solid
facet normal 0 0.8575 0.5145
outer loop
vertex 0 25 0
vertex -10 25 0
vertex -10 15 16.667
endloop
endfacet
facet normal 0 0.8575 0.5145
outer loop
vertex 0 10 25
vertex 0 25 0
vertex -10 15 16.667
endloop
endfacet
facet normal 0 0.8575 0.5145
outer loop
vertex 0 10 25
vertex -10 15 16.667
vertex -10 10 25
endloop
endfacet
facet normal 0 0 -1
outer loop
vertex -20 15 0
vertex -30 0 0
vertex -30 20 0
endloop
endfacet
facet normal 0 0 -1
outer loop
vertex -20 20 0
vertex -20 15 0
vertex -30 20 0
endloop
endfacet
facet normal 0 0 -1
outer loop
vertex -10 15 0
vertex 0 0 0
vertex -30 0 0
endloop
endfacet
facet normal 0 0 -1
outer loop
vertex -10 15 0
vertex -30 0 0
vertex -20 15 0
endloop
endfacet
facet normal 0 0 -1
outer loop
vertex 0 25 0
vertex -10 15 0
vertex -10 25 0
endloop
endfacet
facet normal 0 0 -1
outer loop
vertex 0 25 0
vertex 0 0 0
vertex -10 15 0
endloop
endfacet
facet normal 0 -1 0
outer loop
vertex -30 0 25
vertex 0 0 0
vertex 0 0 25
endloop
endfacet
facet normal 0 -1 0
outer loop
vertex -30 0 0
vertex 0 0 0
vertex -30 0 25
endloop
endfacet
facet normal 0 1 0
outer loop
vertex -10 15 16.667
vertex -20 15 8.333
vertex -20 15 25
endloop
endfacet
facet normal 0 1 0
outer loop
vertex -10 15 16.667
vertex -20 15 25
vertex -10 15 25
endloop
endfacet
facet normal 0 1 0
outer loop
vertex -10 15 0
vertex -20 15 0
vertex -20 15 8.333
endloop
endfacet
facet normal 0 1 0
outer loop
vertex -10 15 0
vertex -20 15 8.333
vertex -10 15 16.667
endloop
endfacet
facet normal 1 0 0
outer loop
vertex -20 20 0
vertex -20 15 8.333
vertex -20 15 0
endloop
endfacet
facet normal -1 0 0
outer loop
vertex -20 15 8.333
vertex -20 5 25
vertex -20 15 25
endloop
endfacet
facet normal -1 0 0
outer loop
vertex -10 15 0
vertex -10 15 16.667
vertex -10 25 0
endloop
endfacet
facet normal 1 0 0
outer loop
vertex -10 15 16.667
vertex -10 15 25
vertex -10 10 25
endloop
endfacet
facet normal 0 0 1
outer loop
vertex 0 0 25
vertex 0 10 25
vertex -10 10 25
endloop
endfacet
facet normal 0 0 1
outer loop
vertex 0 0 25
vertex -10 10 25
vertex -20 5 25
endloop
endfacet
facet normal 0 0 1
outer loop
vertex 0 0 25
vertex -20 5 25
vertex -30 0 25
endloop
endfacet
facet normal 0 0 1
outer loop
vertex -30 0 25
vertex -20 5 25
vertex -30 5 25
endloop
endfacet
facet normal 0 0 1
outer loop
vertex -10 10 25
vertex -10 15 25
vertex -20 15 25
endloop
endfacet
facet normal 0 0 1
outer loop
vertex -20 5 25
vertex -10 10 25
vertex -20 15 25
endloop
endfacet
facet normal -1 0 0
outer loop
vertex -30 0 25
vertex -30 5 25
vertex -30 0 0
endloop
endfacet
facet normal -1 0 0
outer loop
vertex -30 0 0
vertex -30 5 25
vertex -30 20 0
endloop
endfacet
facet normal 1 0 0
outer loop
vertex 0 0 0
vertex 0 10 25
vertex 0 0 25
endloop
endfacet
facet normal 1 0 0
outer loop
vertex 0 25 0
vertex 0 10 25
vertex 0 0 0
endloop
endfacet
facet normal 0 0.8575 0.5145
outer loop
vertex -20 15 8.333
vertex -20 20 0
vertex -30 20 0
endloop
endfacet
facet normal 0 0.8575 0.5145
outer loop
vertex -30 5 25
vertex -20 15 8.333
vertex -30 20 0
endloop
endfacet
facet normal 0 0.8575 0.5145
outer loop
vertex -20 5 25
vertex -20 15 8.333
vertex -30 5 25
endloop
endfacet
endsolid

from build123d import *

# Parameters (mm, degrees)
BOSS_EXTRUDE1_DEPTH = 25
BOSS_EXTRUDE2_DEPTH = 10
BOSS_EXTRUDE3_DEPTH = 10


with BuildPart() as part:
    # Sketch1 → Boss-Extrude1 (new body)
    with BuildSketch(Plane.XY):
        Polygon((-30, 5), (-20, 5), (-20, 15), (-10, 15), (-10, 10), (0, 10), (0, 0), (-30, 0), align=None)
    extrude(amount=BOSS_EXTRUDE1_DEPTH)

    # Sketch2 → Boss-Extrude2 (add)
    with BuildSketch(Plane(origin=(-10, 0, 0), x_dir=(0, 0, -1), z_dir=(1, 0, 0))):
        Polygon((-25, 10), (0, 10), (0, 25), align=None)
    extrude(amount=BOSS_EXTRUDE2_DEPTH)

    # Sketch3 → Boss-Extrude3 (add)
    with BuildSketch(Plane.ZY.offset(20)):
        Polygon((0, 5), (0, 20), (25, 5), align=None)
    extrude(amount=BOSS_EXTRUDE3_DEPTH)


solid = part.part
